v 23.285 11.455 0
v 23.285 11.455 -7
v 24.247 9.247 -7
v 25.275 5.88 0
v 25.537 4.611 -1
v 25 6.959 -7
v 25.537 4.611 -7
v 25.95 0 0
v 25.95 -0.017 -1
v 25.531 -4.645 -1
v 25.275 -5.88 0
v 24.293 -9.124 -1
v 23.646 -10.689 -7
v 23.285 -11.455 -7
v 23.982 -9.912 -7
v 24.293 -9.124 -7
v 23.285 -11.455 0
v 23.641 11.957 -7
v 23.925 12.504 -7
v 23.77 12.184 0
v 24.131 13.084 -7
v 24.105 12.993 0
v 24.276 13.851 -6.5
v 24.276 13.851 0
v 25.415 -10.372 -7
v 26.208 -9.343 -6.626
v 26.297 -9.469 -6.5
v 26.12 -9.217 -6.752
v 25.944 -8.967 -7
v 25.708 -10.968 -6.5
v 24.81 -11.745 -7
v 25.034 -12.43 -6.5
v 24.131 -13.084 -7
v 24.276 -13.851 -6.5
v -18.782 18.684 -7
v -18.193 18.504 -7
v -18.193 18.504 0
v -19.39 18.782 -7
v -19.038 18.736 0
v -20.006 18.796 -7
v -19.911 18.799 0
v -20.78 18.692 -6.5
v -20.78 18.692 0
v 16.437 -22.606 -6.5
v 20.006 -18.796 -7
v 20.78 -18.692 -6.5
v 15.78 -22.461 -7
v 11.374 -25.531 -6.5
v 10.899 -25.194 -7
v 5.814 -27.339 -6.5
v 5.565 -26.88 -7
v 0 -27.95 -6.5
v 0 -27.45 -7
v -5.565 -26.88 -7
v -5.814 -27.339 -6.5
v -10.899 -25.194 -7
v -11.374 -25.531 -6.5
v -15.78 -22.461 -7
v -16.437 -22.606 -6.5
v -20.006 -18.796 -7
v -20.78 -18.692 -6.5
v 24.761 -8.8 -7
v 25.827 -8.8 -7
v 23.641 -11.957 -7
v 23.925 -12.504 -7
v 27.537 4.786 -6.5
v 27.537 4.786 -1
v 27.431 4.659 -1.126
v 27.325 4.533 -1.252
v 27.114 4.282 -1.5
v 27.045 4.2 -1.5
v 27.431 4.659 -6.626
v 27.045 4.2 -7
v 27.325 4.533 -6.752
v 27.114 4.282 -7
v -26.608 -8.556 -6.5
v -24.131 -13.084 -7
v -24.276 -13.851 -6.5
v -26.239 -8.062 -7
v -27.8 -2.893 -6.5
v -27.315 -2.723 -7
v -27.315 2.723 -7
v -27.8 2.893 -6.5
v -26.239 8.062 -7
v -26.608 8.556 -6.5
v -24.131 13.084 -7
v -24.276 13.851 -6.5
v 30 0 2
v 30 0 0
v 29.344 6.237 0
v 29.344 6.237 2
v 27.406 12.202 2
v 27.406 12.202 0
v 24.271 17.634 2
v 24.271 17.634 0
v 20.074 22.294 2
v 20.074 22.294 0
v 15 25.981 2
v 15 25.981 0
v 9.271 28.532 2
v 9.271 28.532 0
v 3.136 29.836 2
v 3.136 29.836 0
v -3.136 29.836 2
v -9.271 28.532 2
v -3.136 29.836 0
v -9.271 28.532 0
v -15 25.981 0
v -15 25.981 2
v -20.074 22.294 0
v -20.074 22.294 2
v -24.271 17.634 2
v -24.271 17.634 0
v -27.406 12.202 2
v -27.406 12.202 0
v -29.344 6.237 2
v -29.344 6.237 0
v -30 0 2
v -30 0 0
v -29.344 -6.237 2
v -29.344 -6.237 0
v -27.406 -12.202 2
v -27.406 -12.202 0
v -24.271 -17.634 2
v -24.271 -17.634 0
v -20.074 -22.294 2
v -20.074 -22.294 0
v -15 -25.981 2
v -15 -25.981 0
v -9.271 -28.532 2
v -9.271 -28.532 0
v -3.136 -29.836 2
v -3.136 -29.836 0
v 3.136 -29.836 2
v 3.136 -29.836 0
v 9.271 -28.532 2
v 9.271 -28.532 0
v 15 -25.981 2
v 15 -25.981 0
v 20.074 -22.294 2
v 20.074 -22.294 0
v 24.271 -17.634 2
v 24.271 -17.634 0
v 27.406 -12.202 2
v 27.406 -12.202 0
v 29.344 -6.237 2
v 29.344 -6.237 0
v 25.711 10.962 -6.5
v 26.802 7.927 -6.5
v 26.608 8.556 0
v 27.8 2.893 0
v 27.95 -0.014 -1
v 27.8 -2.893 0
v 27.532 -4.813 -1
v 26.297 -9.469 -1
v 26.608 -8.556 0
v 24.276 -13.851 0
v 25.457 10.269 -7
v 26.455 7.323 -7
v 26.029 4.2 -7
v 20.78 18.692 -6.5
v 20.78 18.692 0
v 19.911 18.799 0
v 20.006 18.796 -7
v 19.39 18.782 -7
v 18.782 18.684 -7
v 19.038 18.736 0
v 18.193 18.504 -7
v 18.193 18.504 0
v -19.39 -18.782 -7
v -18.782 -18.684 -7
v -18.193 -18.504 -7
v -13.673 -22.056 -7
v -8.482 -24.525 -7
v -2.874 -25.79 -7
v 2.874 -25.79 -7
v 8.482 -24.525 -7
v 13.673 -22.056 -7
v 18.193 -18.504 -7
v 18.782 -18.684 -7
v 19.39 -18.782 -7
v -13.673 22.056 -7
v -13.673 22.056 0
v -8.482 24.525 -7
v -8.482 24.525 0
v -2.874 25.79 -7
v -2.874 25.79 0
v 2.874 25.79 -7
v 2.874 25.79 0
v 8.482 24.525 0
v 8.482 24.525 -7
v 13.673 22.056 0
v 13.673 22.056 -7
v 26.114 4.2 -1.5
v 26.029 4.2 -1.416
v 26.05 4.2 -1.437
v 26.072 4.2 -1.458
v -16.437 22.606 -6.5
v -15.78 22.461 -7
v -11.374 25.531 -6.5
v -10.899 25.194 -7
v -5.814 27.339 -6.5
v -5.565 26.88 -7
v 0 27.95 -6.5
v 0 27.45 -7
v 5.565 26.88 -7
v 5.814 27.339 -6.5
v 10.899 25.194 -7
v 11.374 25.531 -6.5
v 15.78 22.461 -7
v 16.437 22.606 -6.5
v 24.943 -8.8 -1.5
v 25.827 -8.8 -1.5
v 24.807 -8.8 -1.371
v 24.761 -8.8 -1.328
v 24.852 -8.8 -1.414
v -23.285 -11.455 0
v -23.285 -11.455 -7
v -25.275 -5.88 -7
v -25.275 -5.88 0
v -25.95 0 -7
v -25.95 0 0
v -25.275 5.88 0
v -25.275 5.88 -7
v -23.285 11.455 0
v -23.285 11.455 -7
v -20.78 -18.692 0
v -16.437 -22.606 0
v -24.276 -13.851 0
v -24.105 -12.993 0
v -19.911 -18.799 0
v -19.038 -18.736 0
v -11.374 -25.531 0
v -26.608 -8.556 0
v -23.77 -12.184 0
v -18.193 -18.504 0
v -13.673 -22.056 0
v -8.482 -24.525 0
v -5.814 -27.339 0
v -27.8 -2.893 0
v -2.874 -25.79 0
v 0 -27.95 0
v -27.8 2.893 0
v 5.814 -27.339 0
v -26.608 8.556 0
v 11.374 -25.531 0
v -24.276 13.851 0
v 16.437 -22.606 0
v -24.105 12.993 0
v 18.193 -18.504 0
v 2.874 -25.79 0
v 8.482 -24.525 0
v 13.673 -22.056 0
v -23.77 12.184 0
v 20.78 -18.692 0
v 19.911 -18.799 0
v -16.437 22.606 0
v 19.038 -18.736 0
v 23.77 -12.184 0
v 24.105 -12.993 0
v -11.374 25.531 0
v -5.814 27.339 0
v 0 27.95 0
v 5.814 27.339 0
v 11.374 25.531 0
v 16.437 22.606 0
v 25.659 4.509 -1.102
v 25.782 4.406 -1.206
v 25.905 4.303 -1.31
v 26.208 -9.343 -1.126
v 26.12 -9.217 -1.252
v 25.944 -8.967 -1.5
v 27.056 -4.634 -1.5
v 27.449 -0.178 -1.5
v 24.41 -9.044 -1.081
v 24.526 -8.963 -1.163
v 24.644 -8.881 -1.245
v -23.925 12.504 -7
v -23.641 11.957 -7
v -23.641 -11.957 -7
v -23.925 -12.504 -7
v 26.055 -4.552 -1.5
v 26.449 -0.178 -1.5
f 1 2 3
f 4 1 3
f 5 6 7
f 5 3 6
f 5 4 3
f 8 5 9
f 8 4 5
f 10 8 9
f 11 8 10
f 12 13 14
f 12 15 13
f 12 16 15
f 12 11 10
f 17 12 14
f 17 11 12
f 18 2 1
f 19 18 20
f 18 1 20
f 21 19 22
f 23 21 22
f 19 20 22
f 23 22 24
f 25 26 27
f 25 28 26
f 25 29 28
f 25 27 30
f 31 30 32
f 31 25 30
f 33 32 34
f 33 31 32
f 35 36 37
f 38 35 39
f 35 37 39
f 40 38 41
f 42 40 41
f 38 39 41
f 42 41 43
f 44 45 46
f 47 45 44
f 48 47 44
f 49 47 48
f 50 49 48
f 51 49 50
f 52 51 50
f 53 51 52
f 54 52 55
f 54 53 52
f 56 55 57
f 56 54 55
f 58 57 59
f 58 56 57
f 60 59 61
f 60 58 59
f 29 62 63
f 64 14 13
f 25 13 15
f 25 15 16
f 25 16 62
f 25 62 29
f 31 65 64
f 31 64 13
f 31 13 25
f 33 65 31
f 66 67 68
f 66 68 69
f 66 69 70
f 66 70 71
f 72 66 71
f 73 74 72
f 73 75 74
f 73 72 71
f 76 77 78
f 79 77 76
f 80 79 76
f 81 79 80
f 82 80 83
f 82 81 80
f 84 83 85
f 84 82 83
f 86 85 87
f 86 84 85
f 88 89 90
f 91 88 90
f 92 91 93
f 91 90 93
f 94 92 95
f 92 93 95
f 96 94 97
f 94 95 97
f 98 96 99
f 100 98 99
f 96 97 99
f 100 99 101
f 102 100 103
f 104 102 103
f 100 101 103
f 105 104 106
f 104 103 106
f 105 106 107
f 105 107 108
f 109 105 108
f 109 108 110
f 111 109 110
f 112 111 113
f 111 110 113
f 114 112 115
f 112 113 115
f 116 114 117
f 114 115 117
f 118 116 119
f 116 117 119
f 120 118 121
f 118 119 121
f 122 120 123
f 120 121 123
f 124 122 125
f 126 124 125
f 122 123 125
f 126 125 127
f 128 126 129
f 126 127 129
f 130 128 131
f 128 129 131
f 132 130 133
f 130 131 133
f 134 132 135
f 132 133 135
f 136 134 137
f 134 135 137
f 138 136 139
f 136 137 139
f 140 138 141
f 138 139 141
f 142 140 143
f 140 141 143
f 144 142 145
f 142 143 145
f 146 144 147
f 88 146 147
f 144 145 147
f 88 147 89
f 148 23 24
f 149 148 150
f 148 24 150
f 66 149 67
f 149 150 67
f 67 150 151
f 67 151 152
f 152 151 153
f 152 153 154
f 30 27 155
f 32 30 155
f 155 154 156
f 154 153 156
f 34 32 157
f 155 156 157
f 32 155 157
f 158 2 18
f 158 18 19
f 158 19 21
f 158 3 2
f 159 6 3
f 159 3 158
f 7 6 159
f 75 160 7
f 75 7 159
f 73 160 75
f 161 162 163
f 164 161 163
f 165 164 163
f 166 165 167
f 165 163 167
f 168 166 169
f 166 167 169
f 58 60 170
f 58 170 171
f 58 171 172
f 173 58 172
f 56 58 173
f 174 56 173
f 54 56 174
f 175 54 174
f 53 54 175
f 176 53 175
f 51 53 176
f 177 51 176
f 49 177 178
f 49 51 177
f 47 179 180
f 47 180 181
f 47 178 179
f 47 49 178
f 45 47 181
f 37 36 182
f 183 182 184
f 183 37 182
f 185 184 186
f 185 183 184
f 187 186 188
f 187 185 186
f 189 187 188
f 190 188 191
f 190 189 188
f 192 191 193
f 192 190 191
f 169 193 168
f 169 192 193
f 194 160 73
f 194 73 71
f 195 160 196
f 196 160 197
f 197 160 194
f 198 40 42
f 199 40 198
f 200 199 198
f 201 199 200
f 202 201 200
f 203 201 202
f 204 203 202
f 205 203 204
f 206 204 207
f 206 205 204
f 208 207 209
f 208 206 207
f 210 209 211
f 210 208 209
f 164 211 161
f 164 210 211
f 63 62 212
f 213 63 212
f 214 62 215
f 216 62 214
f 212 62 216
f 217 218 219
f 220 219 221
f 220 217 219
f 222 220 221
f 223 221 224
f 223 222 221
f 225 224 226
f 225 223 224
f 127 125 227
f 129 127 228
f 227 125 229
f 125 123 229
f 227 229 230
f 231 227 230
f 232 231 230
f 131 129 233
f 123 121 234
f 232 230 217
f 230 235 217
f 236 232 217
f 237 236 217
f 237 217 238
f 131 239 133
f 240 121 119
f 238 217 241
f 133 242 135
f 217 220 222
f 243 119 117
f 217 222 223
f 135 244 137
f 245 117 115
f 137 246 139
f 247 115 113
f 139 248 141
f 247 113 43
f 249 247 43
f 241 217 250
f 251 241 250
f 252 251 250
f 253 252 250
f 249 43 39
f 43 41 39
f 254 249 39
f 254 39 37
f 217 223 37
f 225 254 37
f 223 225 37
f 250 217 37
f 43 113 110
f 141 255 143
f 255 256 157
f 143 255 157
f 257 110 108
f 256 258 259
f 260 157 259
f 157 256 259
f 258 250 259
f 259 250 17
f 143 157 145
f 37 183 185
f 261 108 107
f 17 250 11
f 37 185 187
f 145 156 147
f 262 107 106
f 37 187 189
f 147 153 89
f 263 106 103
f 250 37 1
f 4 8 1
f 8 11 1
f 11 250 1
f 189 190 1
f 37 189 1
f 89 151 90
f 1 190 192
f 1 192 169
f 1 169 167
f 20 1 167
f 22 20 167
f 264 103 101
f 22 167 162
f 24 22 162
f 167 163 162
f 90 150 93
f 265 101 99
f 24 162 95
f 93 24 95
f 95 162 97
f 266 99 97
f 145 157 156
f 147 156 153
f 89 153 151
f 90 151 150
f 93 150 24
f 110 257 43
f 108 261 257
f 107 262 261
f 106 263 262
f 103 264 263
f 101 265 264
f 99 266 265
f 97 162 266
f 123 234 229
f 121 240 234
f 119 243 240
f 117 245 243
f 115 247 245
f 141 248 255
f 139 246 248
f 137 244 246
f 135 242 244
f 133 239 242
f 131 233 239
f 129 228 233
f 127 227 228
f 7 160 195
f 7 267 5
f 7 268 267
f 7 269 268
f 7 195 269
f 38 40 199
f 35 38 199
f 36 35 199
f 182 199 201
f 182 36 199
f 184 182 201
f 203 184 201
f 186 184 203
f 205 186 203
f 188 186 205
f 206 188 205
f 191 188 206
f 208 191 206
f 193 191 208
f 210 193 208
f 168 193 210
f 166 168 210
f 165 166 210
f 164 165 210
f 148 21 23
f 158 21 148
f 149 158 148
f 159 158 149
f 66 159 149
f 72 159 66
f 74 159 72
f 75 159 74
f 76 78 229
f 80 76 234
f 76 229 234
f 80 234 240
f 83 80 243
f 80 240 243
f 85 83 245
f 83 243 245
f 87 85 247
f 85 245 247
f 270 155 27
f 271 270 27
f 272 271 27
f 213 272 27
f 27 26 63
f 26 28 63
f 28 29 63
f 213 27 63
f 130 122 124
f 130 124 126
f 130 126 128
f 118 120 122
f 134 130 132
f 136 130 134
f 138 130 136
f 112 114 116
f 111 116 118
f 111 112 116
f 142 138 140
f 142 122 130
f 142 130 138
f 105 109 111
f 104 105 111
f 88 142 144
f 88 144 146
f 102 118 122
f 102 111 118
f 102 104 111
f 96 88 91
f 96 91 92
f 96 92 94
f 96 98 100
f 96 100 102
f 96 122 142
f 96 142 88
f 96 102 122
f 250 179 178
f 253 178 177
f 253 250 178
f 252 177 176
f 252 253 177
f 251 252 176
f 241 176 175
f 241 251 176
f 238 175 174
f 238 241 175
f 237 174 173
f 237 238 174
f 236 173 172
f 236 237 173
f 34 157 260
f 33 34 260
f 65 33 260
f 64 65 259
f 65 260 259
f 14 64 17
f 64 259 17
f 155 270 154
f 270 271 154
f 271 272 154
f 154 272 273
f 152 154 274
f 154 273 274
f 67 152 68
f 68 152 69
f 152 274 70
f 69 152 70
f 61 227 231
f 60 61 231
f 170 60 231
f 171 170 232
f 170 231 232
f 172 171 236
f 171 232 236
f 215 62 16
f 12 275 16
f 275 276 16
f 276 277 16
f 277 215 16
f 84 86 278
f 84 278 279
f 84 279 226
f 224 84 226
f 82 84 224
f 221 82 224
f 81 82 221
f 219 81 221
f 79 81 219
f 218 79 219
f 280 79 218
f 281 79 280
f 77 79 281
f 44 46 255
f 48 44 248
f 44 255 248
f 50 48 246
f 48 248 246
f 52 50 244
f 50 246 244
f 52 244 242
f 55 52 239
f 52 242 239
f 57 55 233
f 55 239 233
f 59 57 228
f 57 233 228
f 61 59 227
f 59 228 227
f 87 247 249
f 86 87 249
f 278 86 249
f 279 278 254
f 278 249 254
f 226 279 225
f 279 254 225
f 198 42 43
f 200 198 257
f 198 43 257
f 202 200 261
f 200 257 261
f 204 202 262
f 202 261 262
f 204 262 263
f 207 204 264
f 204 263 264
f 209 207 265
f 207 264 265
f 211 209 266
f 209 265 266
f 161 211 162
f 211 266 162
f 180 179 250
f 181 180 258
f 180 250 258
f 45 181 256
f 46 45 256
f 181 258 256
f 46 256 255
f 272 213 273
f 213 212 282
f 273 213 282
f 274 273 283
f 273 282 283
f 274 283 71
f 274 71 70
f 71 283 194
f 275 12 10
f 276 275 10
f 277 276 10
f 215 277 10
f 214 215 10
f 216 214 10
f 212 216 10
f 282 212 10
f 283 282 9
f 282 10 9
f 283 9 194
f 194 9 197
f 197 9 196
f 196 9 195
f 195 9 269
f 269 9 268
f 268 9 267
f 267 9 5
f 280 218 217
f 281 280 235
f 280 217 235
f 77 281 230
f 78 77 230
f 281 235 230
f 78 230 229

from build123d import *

# Parameters (mm, degrees)
F0_R         = 30
F1_DEPTH     = 2
F2_R         = 27.95
F3_DEPTH     = 7
F4_T         = -2
F5_W         = 13
F5_H         = 10
F6_DEPTH     = 30
F7_T1_DEPTH  = 7.3004746493
F7_T3_DEPTH  = 6.5918643954
F7_T5_DEPTH  = 6.4134609486
F7_T7_DEPTH  = 7.0163816712
F7_T12_ANGLE = 11.2783830284
F7_T17_ANGLE = 20.9875744089
F7_T22_ANGLE = 22.6619870068
F7_T27_ANGLE = 12.1533364168
F7_T30_ANGLE = 338.3067764097
F7_T35_ANGLE = 11.2783830284
F7_T39_DEPTH = 7.0163816712
F7_T47_DEPTH = 7.3004746493
F7_T52_ANGLE = 20.9875744089
F7_T59_ANGLE = 22.6619870068
F7_T63_DEPTH = 6.4134609486
F7_T70_ANGLE = 12.1533364168
F7_T74_DEPTH = 6.5918643954
F8_R         = 4.5
F9_DEPTH     = 25


# Not quite as in the source:
# - a fillet or chamfer that OpenCascade refuses, or shapes differently, is made with other operations: its cross-section is extruded or revolved along the edge and cut away or added


with BuildPart() as f1:
    # F0 (on Top) → F1 (new body)
    with BuildSketch(Plane.XY):
        Circle(F0_R)
    extrude(amount=F1_DEPTH)

    # F2 (on face) → F3 (join)
    with BuildSketch(Plane(origin=(0, 0, 0), x_dir=(1, 0, 0), z_dir=(0, 0, -1))):
        Circle(F2_R)
    extrude(amount=F3_DEPTH)

    # F4
    f4_openings = [f1.faces().sort_by_distance(p)[0] for p in [
        (0, 0, -7),
    ]]
    offset(amount=F4_T, openings=f4_openings, kind=Kind.INTERSECTION)

    # F5 (on Right) → F6 (cut)
    with BuildSketch(Plane.YZ):
        with Locations((-2.3, -6.5)):
            Rectangle(F5_W, F5_H)
    extrude(amount=F6_DEPTH, mode=Mode.SUBTRACT)

    # F7: chamfer of 0.5 on 9 edges, made by hand

    # F7_s2 → F7_t1 (cut)
    with BuildSketch(Plane.XY.offset(-8.8004746493)):
        with BuildLine():
            Line((26.2970147419, -9.4693989071), (25.8265851401, -8.8))
            Line((25.8265851401, -8.8), (26.5285223863, -8.8))
            ThreePointArc((26.5285223863, -8.8), (26.4129758895, -9.1409630052), (26.2970147419, -9.4693989071))
        make_face()
    extrude(amount=F7_T1_DEPTH, mode=Mode.SUBTRACT)

    # F7_s4 → F7_t3 (cut)
    with BuildSketch(Plane.XY.offset(-8.0918643954)):
        with BuildLine():
            Line((26.0290702869, 4.2), (25.5370273703, 4.6111531191))
            ThreePointArc((25.5370273703, 4.6111531191), (25.5719745626, 4.4132320321), (25.6078601215, 4.2))
            Line((25.6078601215, 4.2), (26.0290702869, 4.2))
        make_face()
    extrude(amount=F7_T3_DEPTH, mode=Mode.SUBTRACT)

    # F7_s6 → F7_t5 (cut)
    with BuildSketch(Plane.XY.offset(-7.9134609486)):
        with BuildLine():
            Line((24.7611086182, -8.8), (24.2930347312, -9.1241965974))
            ThreePointArc((24.2930347312, -9.1241965974), (24.3504005172, -8.9699774052), (24.4123431895, -8.8))
            Line((24.4123431895, -8.8), (24.7611086182, -8.8))
        make_face()
    extrude(amount=F7_T5_DEPTH, mode=Mode.SUBTRACT)

    # F7_s8 → F7_t7 (cut)
    with BuildSketch(Plane.XY.offset(-8.5163816712)):
        with BuildLine():
            Line((27.5372554008, 4.7856102004), (27.0446390251, 4.2))
            Line((27.0446390251, 4.2), (27.6326346916, 4.2))
            ThreePointArc((27.6326346916, 4.2), (27.585450674, 4.4994900946), (27.5372554008, 4.7856102004))
        make_face()
    extrude(amount=F7_T7_DEPTH, mode=Mode.SUBTRACT)


with BuildPart() as f7_tool10:
    # F7_s11 → F7_t12 (revolve)
    with BuildSketch(Plane.XZ):
        Polygon((27.95, -1), (27.45, -1.5), (27.95, -1.5), align=None)
    revolve(axis=Axis((0, 0, -1.5), (0, 0, 1)), revolution_arc=F7_T12_ANGLE)

    split(bisect_by=Plane.XZ.offset(-4.2), keep=Keep.TOP)


with BuildPart() as f1_1:
    add(f1.part)

    # F7_t9: cut F7_tool10
    add(f7_tool10.part, mode=Mode.SUBTRACT)


with BuildPart() as f7_tool15:
    # F7_s16 → F7_t17 (revolve)
    with BuildSketch(Plane(origin=(0, 0, 0), x_dir=(0, 0, 1), z_dir=(-0.3581654779, -0.9336581229, 0))):
        Polygon((-1, -27.95), (-1.5, -27.45), (-1.5, -27.95), align=None)
    revolve(axis=Axis((0, 0, -1.5), (0, 0, 1)), revolution_arc=F7_T17_ANGLE)

    split(bisect_by=Plane.XZ.offset(8.8), keep=Keep.BOTTOM)


with BuildPart() as f1_2:
    add(f1_1.part)

    # F7_t14: cut F7_tool15
    add(f7_tool15.part, mode=Mode.SUBTRACT)


with BuildPart() as f7_tool20:
    # F7_s21 → F7_t22 (revolve)
    with BuildSketch(Plane(origin=(0, 0, 0), x_dir=(0, 0, 1), z_dir=(-0.3852938978, -0.9227939165, 0))):
        Polygon((-1.5, -26.45), (-1, -25.95), (-1.5, -25.95), align=None)
    revolve(axis=Axis((0, 0, -1.5), (0, 0, 1)), revolution_arc=F7_T22_ANGLE)

    split(bisect_by=Plane.XZ.offset(8.8), keep=Keep.BOTTOM)


with BuildPart() as f1_3:
    add(f1_2.part)

    # F7_t19: cut F7_tool20
    add(f7_tool20.part, mode=Mode.SUBTRACT)


with BuildPart() as f7_tool25:
    # F7_s26 → F7_t27 (revolve)
    with BuildSketch(Plane.XZ):
        Polygon((26.45, -1.5), (25.95, -1), (25.95, -1.5), align=None)
    revolve(axis=Axis((0, 0, -1.5), (0, 0, 1)), revolution_arc=F7_T27_ANGLE)

    split(bisect_by=Plane.XZ.offset(-4.2), keep=Keep.TOP)


with BuildPart() as f1_4:
    add(f1_3.part)

    # F7_t24: cut F7_tool25
    add(f7_tool25.part, mode=Mode.SUBTRACT)

    # F7_s29 → F7_t30 (revolve, cut)
    with BuildSketch(Plane(origin=(0, 0, 0), x_dir=(0, 0, 1), z_dir=(0.2706204465, 0.9626861243, 0))):
        Polygon((-6.5, 27.95), (-7, 27.45), (-7, 27.95), align=None)
    revolve(axis=Axis((0, 0, -7), (0, 0, -1)), revolution_arc=F7_T30_ANGLE, mode=Mode.SUBTRACT)


with BuildPart() as f7_tool33:
    # F7_s34 → F7_t35 (revolve)
    with BuildSketch(Plane.XZ):
        Polygon((27.95, -1), (27.45, -1.5), (27.95, -1.5), align=None)
    revolve(axis=Axis((0, 0, -1.5), (0, 0, 1)), revolution_arc=F7_T35_ANGLE)

    split(bisect_by=Plane.XZ.offset(-4.2), keep=Keep.BOTTOM)


with BuildPart() as f7_tool37:
    # F7_s38 → F7_t39 (new body)
    with BuildSketch(Plane.XY.offset(-7)):
        with BuildLine():
            Line((27.5372554008, 4.7856102004), (27.0446390251, 4.2))
            Line((27.0446390251, 4.2), (27.6326346916, 4.2))
            ThreePointArc((27.6326346916, 4.2), (27.585450674, 4.4994900946), (27.5372554008, 4.7856102004))
        make_face()
    extrude(amount=F7_T39_DEPTH)

    split(bisect_by=Plane.XY, keep=Keep.BOTTOM)

    split(bisect_by=Plane.XY.offset(-1.5), keep=Keep.TOP)


with BuildPart() as f7_tool33_1:
    add(f7_tool33.part)

    # F7_t42: intersect F7_tool37
    add(f7_tool37.part, mode=Mode.INTERSECT)


with BuildPart() as f1_5:
    add(f1_4.part)

    # F7_t31: cut F7_tool33
    add(f7_tool33_1.part, mode=Mode.SUBTRACT)


with BuildPart() as f7_tool45:
    # F7_s46 → F7_t47 (new body)
    with BuildSketch(Plane.XY.offset(-7)):
        with BuildLine():
            Line((26.2970147419, -9.4693989071), (25.8265851401, -8.8))
            Line((25.8265851401, -8.8), (26.5285223863, -8.8))
            ThreePointArc((26.5285223863, -8.8), (26.4129758895, -9.1409630052), (26.2970147419, -9.4693989071))
        make_face()
    extrude(amount=F7_T47_DEPTH)

    split(bisect_by=Plane.XY, keep=Keep.BOTTOM)

    split(bisect_by=Plane.XY.offset(-1.5), keep=Keep.TOP)


with BuildPart() as f7_tool50:
    # F7_s51 → F7_t52 (revolve)
    with BuildSketch(Plane(origin=(0, 0, 0), x_dir=(0, 0, 1), z_dir=(-0.3581654779, -0.9336581229, 0))):
        Polygon((-1, -27.95), (-1.5, -27.45), (-1.5, -27.95), align=None)
    revolve(axis=Axis((0, 0, -1.5), (0, 0, 1)), revolution_arc=F7_T52_ANGLE)

    split(bisect_by=Plane.XZ.offset(8.8), keep=Keep.TOP)


with BuildPart() as f7_tool45_1:
    add(f7_tool45.part)

    # F7_t54: intersect F7_tool50
    add(f7_tool50.part, mode=Mode.INTERSECT)


with BuildPart() as f1_6:
    add(f1_5.part)

    # F7_t43: cut F7_tool45
    add(f7_tool45_1.part, mode=Mode.SUBTRACT)


with BuildPart() as f7_tool57:
    # F7_s58 → F7_t59 (revolve)
    with BuildSketch(Plane(origin=(0, 0, 0), x_dir=(0, 0, 1), z_dir=(-0.3852938978, -0.9227939165, 0))):
        Polygon((-1.5, -26.45), (-1, -25.95), (-1.5, -25.95), align=None)
    revolve(axis=Axis((0, 0, -1.5), (0, 0, 1)), revolution_arc=F7_T59_ANGLE)

    split(bisect_by=Plane.XZ.offset(8.8), keep=Keep.TOP)


with BuildPart() as f7_tool61:
    # F7_s62 → F7_t63 (new body)
    with BuildSketch(Plane.XY.offset(-7)):
        with BuildLine():
            Line((24.7611086182, -8.8), (24.2930347312, -9.1241965974))
            ThreePointArc((24.2930347312, -9.1241965974), (24.3504005172, -8.9699774052), (24.4123431895, -8.8))
            Line((24.4123431895, -8.8), (24.7611086182, -8.8))
        make_face()
    extrude(amount=F7_T63_DEPTH)

    split(bisect_by=Plane.XY.offset(-1.5), keep=Keep.TOP)


with BuildPart() as f7_tool57_1:
    add(f7_tool57.part)

    # F7_t65: intersect F7_tool61
    add(f7_tool61.part, mode=Mode.INTERSECT)


with BuildPart() as f1_7:
    add(f1_6.part)

    # F7_t55: cut F7_tool57
    add(f7_tool57_1.part, mode=Mode.SUBTRACT)


with BuildPart() as f7_tool68:
    # F7_s69 → F7_t70 (revolve)
    with BuildSketch(Plane.XZ):
        Polygon((26.45, -1.5), (25.95, -1), (25.95, -1.5), align=None)
    revolve(axis=Axis((0, 0, -1.5), (0, 0, 1)), revolution_arc=F7_T70_ANGLE)

    split(bisect_by=Plane.XZ.offset(-4.2), keep=Keep.BOTTOM)


with BuildPart() as f7_tool72:
    # F7_s73 → F7_t74 (new body)
    with BuildSketch(Plane.XY.offset(-7)):
        with BuildLine():
            Line((26.0290702869, 4.2), (25.5370273703, 4.6111531191))
            ThreePointArc((25.5370273703, 4.6111531191), (25.5719745626, 4.4132320321), (25.6078601215, 4.2))
            Line((25.6078601215, 4.2), (26.0290702869, 4.2))
        make_face()
    extrude(amount=F7_T74_DEPTH)

    split(bisect_by=Plane.XY.offset(-1.5), keep=Keep.TOP)


with BuildPart() as f7_tool68_1:
    add(f7_tool68.part)

    # F7_t76: intersect F7_tool72
    add(f7_tool72.part, mode=Mode.INTERSECT)


with BuildPart() as f1_8:
    add(f1_7.part)

    # F7_t66: cut F7_tool68
    add(f7_tool68_1.part, mode=Mode.SUBTRACT)

    # F8 (on face) → F9 (cut)
    with BuildSketch(Plane.XY):
        with Locations((19.798791036, -14.3004134297)):
            Circle(F8_R)
        with Locations((-19.798791036, -14.3004134297)):
            Circle(F8_R)
        with Locations((19.798791036, 14.3004134297)):
            Circle(F8_R)
        with Locations((-19.798791036, 14.3004134297)):
            Circle(F8_R)
    extrude(amount=-F9_DEPTH, mode=Mode.SUBTRACT)


solid = f1_8.part
